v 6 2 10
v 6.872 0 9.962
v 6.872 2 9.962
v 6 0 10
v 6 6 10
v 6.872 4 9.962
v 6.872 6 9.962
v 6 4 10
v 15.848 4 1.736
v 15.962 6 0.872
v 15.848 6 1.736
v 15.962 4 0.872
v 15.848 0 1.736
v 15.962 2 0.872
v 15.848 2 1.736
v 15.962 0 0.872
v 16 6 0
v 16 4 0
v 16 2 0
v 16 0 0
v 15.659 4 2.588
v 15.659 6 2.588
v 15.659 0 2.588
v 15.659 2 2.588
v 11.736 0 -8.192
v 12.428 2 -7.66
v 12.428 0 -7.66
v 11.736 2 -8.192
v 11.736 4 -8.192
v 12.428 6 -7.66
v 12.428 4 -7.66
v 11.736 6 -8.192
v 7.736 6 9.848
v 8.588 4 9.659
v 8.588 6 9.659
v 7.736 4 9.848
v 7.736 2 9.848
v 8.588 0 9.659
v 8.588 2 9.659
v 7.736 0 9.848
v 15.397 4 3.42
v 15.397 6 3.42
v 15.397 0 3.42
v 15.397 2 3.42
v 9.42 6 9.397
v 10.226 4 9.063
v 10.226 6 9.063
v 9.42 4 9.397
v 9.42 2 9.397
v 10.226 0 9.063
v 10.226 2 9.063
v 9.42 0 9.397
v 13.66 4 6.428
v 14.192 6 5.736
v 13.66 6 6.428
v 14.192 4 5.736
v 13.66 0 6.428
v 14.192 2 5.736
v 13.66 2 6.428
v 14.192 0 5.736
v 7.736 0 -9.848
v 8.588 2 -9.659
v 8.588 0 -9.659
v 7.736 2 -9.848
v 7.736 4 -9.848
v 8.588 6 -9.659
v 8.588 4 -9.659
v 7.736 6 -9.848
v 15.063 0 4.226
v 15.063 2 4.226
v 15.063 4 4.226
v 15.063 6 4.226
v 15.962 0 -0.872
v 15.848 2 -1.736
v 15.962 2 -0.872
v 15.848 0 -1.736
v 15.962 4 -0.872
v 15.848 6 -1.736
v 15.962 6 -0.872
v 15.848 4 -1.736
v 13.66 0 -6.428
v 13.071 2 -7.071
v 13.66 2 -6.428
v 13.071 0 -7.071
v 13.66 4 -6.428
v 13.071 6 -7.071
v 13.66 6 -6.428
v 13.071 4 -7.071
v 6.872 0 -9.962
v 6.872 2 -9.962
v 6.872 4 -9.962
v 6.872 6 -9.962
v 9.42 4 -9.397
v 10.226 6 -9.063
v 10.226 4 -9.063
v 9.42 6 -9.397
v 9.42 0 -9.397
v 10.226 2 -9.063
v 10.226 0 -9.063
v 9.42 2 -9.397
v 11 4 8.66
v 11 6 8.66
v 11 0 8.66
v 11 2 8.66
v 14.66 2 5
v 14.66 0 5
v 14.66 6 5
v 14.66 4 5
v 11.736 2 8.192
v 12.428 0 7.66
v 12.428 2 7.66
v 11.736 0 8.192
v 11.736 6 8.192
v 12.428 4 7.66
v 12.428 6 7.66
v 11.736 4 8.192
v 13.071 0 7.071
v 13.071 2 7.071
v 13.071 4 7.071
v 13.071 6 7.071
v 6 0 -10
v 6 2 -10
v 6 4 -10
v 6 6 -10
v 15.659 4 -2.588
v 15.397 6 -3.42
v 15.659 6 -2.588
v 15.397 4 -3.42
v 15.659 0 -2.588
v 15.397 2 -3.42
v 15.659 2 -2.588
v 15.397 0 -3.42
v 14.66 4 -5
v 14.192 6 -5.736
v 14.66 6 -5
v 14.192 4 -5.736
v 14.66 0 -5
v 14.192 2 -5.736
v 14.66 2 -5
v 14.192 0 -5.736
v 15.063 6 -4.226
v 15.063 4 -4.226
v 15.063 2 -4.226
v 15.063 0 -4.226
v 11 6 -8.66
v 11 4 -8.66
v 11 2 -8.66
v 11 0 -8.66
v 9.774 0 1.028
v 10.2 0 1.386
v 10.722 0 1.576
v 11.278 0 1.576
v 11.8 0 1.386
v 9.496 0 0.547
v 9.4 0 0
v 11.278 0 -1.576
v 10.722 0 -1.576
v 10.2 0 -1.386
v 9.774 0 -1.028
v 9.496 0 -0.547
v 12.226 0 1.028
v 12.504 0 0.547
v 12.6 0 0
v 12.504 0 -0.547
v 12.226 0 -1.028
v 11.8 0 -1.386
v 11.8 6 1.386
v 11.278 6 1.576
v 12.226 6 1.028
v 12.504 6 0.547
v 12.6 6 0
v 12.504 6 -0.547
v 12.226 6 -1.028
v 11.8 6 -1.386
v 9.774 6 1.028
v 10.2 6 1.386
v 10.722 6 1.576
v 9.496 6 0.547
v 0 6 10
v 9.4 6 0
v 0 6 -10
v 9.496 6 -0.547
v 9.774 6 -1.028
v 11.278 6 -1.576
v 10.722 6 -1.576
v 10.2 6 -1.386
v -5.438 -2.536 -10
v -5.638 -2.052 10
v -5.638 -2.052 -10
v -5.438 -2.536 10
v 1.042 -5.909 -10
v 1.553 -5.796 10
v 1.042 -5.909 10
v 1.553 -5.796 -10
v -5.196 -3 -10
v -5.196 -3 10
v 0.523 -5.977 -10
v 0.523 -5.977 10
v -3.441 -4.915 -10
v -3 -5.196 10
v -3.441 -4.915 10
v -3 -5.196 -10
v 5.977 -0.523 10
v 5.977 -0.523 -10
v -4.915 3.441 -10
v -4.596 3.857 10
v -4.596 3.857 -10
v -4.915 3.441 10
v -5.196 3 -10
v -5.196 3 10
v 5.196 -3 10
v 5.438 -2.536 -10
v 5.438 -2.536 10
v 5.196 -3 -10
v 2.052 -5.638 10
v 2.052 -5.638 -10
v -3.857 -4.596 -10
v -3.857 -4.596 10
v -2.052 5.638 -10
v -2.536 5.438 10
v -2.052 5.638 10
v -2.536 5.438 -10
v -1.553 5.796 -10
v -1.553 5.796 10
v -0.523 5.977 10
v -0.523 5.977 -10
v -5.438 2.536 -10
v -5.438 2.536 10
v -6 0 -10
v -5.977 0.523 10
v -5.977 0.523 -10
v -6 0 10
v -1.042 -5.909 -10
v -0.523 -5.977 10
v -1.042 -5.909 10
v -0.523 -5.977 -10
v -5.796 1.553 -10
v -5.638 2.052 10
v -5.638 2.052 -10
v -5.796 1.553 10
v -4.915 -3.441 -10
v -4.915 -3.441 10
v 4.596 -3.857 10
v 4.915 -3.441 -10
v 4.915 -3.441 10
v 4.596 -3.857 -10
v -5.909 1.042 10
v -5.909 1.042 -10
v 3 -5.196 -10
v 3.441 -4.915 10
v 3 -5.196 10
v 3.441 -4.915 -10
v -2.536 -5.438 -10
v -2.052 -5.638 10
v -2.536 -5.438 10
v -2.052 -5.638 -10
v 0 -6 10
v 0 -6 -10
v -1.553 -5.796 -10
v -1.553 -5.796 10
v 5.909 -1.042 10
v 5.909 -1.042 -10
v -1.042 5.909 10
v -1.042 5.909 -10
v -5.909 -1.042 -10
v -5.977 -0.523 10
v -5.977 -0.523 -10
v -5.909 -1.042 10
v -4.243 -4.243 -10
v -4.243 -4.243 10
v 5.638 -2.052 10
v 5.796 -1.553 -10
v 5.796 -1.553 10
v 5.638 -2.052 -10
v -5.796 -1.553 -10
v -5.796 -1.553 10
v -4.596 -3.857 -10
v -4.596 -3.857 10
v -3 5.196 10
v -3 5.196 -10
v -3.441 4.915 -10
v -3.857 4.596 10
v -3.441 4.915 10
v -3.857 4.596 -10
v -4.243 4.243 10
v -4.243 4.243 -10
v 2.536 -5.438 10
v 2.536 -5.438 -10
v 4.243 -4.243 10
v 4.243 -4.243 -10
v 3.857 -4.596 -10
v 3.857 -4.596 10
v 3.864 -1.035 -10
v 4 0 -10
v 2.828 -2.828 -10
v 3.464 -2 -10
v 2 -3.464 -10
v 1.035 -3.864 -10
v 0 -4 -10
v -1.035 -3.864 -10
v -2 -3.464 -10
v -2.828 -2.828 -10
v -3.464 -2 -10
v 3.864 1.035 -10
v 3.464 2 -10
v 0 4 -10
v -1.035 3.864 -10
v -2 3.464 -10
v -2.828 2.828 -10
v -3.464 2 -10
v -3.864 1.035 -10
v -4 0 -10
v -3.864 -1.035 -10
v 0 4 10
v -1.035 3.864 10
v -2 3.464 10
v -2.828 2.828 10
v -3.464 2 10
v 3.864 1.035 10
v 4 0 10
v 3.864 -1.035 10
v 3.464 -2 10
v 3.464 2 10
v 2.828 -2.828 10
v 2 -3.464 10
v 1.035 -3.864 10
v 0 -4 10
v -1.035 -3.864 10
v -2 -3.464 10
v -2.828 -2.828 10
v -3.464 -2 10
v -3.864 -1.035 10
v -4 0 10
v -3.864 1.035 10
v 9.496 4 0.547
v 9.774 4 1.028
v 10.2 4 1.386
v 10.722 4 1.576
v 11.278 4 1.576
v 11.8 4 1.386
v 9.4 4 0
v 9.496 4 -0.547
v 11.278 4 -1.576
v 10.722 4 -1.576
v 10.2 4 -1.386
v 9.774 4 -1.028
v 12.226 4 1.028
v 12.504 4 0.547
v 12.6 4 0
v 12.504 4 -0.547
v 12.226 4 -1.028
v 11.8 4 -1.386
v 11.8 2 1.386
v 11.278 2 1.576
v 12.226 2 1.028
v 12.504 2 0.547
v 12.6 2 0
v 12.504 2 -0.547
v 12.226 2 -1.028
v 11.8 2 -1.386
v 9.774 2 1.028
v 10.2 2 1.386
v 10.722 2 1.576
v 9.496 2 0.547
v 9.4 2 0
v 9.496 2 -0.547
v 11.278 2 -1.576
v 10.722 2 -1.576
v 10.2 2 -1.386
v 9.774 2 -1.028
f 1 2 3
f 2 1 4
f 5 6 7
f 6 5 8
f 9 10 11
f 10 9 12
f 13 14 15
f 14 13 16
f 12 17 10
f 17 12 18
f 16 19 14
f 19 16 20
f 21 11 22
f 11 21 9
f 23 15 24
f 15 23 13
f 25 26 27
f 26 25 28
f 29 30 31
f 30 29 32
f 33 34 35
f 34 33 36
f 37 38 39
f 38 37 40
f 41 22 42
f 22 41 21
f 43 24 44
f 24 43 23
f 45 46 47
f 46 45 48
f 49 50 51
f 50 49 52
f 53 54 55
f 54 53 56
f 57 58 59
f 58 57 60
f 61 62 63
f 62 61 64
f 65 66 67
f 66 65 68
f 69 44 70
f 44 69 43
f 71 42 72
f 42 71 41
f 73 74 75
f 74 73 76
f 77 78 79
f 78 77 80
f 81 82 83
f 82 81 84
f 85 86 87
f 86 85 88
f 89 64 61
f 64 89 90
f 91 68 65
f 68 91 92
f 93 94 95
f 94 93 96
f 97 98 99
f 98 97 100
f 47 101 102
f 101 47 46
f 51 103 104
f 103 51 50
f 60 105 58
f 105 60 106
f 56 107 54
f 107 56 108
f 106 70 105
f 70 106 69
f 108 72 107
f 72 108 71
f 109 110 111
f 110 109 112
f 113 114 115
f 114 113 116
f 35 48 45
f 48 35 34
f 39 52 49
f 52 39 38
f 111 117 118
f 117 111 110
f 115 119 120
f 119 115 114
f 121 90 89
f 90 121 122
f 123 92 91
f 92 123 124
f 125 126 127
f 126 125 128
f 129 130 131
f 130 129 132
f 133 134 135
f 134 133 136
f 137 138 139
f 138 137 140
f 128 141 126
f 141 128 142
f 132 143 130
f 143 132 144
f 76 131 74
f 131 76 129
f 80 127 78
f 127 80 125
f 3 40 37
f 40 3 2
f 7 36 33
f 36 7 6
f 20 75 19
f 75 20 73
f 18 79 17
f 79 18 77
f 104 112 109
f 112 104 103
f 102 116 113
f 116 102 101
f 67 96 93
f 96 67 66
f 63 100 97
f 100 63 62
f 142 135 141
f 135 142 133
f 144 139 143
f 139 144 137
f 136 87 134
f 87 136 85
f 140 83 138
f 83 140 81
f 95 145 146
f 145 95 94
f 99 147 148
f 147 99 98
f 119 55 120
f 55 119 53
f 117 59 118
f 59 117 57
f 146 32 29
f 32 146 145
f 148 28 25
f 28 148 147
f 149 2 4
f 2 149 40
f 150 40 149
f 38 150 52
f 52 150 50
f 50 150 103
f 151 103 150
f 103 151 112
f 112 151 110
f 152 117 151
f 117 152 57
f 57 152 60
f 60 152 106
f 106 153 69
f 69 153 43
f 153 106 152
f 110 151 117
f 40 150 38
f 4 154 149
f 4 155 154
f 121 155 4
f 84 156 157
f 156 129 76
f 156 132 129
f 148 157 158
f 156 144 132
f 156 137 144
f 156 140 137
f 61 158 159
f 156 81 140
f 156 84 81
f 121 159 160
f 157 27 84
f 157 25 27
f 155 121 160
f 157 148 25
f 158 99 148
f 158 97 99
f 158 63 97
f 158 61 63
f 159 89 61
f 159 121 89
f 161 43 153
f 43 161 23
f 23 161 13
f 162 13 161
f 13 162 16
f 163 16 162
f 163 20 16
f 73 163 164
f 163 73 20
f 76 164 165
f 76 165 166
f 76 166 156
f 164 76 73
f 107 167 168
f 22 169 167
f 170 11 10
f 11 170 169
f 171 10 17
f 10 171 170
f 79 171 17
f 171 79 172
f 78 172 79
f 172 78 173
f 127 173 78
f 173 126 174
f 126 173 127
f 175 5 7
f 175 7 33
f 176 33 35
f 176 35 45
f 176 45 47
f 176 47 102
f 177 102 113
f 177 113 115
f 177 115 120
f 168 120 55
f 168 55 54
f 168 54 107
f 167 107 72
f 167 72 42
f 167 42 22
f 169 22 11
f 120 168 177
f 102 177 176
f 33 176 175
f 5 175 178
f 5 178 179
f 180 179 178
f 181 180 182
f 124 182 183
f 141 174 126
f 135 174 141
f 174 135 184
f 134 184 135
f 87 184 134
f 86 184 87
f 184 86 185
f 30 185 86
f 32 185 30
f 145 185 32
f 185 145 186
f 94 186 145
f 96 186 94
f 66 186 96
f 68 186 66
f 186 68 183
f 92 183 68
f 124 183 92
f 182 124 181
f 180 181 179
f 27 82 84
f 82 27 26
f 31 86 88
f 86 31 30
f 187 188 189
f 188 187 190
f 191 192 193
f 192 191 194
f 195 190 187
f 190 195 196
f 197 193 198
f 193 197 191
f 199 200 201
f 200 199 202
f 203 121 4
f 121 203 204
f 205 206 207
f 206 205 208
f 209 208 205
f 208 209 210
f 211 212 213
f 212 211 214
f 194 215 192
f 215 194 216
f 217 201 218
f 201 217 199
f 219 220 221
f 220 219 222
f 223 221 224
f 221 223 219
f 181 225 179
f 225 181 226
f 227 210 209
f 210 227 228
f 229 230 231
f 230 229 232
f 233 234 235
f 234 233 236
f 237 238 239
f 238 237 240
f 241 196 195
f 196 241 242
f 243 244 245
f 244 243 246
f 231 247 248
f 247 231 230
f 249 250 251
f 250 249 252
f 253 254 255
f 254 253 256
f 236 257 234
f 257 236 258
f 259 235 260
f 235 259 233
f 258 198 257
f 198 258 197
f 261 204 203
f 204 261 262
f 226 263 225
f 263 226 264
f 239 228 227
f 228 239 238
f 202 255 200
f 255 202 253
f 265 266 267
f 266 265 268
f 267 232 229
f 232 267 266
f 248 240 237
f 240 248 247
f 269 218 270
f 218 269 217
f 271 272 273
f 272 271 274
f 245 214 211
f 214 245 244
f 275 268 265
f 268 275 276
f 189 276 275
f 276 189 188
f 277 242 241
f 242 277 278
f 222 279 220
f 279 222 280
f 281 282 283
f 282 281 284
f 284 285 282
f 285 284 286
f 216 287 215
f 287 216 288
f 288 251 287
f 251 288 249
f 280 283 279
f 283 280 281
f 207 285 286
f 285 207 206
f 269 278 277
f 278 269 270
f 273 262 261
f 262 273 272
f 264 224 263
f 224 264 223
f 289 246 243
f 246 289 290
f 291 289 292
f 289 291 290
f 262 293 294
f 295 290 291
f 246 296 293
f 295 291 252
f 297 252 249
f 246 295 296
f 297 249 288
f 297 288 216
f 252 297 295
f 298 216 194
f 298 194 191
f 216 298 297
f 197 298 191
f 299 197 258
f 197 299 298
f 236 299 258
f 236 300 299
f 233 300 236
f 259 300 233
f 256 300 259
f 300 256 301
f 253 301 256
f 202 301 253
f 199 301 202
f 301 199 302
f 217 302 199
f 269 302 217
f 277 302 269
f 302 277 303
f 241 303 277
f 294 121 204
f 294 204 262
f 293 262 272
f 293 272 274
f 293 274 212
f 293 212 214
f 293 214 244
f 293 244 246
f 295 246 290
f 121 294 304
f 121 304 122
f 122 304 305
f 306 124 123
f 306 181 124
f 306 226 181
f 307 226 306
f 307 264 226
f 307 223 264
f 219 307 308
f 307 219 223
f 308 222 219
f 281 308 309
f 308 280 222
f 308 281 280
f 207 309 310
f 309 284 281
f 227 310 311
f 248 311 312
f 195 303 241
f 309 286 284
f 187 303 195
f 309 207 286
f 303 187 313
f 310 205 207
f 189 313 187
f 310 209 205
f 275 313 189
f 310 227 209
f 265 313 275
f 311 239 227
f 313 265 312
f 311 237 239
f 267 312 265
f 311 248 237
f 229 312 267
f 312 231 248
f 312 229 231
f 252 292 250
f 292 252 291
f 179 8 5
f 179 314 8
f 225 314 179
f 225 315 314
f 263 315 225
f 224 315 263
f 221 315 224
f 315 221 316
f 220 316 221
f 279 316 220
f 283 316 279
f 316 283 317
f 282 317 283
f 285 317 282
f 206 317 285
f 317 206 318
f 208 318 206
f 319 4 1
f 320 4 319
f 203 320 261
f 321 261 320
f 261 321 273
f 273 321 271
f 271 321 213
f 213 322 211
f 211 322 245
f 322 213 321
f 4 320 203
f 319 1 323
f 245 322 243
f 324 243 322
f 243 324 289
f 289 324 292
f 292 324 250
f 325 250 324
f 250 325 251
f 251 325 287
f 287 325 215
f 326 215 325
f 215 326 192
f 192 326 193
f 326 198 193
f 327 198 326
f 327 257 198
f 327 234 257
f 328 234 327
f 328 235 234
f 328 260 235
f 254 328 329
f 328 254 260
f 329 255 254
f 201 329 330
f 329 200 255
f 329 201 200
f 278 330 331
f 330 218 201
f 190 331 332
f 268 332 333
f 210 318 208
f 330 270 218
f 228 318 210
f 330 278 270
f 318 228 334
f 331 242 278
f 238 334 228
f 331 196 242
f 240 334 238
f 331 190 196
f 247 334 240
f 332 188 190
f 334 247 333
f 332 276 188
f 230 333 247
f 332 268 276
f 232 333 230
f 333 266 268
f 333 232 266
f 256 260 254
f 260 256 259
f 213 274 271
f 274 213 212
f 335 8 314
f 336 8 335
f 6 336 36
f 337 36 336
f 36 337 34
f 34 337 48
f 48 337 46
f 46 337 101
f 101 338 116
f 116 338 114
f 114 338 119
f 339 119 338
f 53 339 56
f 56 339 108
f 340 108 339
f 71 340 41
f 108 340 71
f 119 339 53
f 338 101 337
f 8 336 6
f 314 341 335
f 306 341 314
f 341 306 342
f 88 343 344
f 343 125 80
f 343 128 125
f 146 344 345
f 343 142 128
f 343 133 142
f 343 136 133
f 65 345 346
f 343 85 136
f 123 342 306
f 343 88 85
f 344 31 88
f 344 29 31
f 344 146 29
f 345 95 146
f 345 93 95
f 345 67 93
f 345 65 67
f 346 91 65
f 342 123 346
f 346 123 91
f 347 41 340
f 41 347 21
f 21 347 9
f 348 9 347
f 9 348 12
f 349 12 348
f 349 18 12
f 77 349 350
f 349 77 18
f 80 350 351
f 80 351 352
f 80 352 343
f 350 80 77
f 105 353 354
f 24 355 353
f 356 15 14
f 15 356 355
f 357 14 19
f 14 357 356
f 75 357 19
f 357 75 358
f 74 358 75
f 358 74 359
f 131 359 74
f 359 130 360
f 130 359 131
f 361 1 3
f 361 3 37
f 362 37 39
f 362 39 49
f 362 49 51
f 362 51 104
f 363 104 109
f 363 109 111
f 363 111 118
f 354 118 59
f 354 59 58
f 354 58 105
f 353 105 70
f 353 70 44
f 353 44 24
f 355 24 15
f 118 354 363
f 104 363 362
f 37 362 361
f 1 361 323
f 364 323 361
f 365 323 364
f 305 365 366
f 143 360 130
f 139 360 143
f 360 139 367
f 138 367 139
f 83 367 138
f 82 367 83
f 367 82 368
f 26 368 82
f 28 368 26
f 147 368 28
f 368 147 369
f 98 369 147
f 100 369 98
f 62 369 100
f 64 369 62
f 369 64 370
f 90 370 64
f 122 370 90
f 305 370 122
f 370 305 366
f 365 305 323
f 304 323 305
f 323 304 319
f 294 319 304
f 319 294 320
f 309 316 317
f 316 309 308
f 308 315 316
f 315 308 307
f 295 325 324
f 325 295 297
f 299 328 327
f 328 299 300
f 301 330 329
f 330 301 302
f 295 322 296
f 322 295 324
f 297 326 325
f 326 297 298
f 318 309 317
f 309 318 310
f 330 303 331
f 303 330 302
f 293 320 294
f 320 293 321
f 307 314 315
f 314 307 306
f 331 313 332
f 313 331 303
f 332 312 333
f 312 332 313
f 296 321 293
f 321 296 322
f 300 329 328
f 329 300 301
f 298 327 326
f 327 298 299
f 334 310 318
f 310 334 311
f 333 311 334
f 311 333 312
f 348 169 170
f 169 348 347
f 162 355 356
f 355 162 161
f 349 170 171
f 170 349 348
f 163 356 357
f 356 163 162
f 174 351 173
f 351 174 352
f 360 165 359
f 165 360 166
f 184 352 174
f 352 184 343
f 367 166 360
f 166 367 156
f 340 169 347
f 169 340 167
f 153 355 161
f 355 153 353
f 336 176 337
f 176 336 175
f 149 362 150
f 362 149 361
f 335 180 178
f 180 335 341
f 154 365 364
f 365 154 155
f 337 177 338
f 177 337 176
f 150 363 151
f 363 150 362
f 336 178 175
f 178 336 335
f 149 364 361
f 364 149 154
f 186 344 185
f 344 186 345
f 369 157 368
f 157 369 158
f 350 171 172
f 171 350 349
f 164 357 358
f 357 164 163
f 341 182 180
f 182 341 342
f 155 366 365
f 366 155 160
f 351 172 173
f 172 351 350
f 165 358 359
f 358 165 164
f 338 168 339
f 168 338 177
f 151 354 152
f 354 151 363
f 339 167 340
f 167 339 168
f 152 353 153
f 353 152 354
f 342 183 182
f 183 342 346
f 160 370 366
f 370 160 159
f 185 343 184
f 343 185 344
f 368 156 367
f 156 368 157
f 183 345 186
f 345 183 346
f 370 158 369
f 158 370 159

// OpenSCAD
//The radius of the cable thickness
cable_thickness_r = 4;

//The strength/thickness of the wall
wall_thickness = 2;

//The height of the clip
height = 20;

/* [Hidden] */
outer_size = cable_thickness_r + wall_thickness;

difference()
{
    //Outside shell
    union()
    {
        hull()
        {
            cylinder(r=outer_size,h=height,$fn=72, center=true);

            translate([0,0,-height/2])
            cube([outer_size,outer_size,height]);
        }
        
        difference()
        {
            translate([outer_size,outer_size/2,0])
            rotate([90,0,0])
            cylinder(r=height/2,h=outer_size,$fn=72,center=true);
            
            translate([-outer_size - height,-1,-height/2])
            cube([outer_size + height,outer_size + 2,height]);
        }
    }
    
    //Remove thightner opening
    translate([0,wall_thickness,-height/2])
    cube([height + outer_size,outer_size - wall_thickness*2,height]);

    //make center cable hole
    cylinder(r=cable_thickness_r,h=height+1,center=true,$fn=24);
    
    //make mounting hole
    translate([outer_size + height/4,0,0])
    rotate([90,0,0])
    cylinder(r=1.6,h=(outer_size*2)+1,center=true,$fn=18);
}
